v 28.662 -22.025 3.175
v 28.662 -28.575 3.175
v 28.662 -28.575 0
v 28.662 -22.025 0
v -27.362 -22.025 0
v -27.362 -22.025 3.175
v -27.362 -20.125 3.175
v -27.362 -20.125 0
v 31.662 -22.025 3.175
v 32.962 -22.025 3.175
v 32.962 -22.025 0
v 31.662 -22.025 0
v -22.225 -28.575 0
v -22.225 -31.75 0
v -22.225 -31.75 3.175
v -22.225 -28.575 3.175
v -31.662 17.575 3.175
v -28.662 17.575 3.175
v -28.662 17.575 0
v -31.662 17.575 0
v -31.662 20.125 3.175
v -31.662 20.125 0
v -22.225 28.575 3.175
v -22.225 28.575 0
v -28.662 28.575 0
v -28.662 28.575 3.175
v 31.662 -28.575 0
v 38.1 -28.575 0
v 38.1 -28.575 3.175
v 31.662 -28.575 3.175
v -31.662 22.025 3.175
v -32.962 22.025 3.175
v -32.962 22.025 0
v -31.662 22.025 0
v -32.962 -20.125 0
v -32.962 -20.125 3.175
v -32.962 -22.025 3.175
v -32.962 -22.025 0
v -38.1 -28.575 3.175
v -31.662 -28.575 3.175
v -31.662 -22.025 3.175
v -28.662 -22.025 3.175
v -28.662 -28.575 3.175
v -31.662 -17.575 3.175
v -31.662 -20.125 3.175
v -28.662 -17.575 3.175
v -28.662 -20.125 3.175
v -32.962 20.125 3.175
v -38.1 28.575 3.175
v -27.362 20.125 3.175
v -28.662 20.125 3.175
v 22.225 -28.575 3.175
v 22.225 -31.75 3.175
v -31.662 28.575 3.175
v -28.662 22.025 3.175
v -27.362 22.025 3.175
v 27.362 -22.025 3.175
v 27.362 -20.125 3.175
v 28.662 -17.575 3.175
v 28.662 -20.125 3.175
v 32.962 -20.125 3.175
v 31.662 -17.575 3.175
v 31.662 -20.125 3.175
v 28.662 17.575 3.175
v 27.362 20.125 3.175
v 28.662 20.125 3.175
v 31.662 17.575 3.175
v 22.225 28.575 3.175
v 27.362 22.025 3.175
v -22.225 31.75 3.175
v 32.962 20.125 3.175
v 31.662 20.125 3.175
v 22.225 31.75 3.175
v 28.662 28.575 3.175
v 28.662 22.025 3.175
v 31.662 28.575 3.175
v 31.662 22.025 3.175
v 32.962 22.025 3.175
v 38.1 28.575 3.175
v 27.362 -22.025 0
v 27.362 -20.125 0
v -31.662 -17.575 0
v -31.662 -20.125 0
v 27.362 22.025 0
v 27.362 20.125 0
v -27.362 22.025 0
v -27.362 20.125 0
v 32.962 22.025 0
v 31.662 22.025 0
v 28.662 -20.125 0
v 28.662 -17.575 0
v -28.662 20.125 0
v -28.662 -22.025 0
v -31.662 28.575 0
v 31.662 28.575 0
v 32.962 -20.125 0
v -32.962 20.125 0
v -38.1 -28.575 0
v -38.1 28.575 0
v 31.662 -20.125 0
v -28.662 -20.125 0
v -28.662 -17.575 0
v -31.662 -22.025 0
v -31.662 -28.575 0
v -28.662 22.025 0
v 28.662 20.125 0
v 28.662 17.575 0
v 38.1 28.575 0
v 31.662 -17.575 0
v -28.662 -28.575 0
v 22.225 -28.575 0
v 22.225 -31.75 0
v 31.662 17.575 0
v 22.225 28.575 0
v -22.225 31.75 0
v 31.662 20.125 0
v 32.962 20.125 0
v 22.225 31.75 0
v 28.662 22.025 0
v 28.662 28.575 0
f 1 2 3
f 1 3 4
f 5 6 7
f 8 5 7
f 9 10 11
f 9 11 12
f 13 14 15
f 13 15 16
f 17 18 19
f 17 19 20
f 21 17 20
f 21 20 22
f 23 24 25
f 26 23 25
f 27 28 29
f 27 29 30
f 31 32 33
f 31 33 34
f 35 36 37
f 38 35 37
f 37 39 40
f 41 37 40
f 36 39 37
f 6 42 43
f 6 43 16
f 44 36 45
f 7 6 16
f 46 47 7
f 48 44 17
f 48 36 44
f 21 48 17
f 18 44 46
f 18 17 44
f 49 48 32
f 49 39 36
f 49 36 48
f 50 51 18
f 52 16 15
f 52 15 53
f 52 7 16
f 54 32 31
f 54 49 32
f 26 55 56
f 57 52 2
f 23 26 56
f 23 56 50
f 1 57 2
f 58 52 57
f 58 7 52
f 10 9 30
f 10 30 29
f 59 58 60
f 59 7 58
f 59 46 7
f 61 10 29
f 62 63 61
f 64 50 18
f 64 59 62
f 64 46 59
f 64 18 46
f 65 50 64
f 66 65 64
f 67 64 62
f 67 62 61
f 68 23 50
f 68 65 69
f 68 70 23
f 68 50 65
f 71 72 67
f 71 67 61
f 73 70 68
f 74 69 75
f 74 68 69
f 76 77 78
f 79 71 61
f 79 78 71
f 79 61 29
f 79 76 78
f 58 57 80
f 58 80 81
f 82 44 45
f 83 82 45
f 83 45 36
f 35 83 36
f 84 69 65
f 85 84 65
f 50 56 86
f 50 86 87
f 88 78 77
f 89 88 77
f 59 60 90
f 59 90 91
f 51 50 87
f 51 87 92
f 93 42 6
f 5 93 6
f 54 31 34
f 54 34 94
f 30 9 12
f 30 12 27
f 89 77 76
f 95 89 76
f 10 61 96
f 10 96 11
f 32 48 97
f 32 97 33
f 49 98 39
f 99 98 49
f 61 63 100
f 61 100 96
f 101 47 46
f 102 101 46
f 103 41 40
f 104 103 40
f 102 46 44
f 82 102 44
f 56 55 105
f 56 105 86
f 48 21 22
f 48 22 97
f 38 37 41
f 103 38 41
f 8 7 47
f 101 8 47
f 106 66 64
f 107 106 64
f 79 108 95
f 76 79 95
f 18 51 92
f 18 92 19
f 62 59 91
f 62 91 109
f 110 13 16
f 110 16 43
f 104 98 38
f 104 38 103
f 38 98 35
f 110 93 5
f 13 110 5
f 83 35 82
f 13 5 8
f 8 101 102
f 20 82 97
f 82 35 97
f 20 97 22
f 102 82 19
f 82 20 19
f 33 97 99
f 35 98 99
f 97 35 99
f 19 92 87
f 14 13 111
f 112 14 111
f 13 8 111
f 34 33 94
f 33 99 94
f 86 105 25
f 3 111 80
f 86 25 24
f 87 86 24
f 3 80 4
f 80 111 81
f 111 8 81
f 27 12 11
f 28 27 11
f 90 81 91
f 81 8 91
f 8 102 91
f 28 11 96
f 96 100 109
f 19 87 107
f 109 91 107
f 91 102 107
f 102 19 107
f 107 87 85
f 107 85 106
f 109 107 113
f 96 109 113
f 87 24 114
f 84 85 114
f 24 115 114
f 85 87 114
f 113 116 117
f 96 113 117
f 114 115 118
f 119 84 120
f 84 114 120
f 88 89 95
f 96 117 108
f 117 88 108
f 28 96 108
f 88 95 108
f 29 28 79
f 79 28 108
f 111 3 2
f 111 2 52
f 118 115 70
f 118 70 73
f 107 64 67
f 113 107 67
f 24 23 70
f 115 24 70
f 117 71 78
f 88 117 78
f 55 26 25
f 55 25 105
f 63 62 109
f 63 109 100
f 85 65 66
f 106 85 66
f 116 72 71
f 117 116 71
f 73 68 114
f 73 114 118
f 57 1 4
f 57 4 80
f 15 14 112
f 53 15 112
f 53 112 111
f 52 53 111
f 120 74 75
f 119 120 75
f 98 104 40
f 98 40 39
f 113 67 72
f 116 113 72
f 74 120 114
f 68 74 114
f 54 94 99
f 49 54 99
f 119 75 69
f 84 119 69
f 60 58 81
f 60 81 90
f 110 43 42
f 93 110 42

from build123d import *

# Parameters (mm, degrees)
SKETCH1_W           = 76.2
SKETCH1_H           = 63.5
BOSS_EXTRUDE1_DEPTH = 3.175
SKETCH2_W           = 15.875
SKETCH2_H           = 3.175
CUT_EXTRUDE1_DEPTH  = 50.6966108
CUT_EXTRUDE2_DEPTH  = 50.6966108


with BuildPart() as part:
    # Sketch1 → Boss-Extrude1 (new body)
    with BuildSketch(Plane.XY):
        Rectangle(SKETCH1_W, SKETCH1_H)
    extrude(amount=BOSS_EXTRUDE1_DEPTH)

    # Sketch2 → Cut-Extrude1 (cut, through all)
    with BuildSketch(Plane(origin=(0, 0, 0), x_dir=(-1, 0, 0), z_dir=(0, 0, -1))):
        with Locations((-30.1625, -30.1625)):
            Rectangle(SKETCH2_W, SKETCH2_H)
        with Locations((30.1625, -30.1625)):
            Rectangle(SKETCH2_W, SKETCH2_H)
        with Locations((30.1625, 30.1625)):
            Rectangle(SKETCH2_W, SKETCH2_H)
        with Locations((-30.1625, 30.1625)):
            Rectangle(SKETCH2_W, SKETCH2_H)
    extrude(amount=-CUT_EXTRUDE1_DEPTH, mode=Mode.SUBTRACT)

    # Sketch3 → Cut-Extrude2 (cut, through all)
    with BuildSketch(Plane.XY.offset(3.175)):
        Polygon((31.6625, -17.575), (31.6625, -20.125), (32.9625, -20.125), (32.9625, -22.025), (31.6625, -22.025), (31.6625, -28.575), (28.6625, -28.575), (28.6625, -22.025), (27.3625, -22.025), (27.3625, -20.125), (28.6625, -20.125), (28.6625, -17.575), align=None)
        Polygon((-31.6625, -20.125), (-32.9625, -20.125), (-32.9625, -22.025), (-31.6625, -22.025), (-31.6625, -28.575), (-28.6625, -28.575), (-28.6625, -22.025), (-27.3625, -22.025), (-27.3625, -20.125), (-28.6625, -20.125), (-28.6625, -17.575), (-31.6625, -17.575), align=None)
        Polygon((31.6625, 20.125), (32.9625, 20.125), (32.9625, 22.025), (31.6625, 22.025), (31.6625, 28.575), (28.6625, 28.575), (28.6625, 22.025), (27.3625, 22.025), (27.3625, 20.125), (28.6625, 20.125), (28.6625, 17.575), (31.6625, 17.575), align=None)
        Polygon((-31.6625, 17.575), (-31.6625, 20.125), (-32.9625, 20.125), (-32.9625, 22.025), (-31.6625, 22.025), (-31.6625, 28.575), (-28.6625, 28.575), (-28.6625, 22.025), (-27.3625, 22.025), (-27.3625, 20.125), (-28.6625, 20.125), (-28.6625, 17.575), align=None)
    extrude(amount=-CUT_EXTRUDE2_DEPTH, mode=Mode.SUBTRACT)


solid = part.part
